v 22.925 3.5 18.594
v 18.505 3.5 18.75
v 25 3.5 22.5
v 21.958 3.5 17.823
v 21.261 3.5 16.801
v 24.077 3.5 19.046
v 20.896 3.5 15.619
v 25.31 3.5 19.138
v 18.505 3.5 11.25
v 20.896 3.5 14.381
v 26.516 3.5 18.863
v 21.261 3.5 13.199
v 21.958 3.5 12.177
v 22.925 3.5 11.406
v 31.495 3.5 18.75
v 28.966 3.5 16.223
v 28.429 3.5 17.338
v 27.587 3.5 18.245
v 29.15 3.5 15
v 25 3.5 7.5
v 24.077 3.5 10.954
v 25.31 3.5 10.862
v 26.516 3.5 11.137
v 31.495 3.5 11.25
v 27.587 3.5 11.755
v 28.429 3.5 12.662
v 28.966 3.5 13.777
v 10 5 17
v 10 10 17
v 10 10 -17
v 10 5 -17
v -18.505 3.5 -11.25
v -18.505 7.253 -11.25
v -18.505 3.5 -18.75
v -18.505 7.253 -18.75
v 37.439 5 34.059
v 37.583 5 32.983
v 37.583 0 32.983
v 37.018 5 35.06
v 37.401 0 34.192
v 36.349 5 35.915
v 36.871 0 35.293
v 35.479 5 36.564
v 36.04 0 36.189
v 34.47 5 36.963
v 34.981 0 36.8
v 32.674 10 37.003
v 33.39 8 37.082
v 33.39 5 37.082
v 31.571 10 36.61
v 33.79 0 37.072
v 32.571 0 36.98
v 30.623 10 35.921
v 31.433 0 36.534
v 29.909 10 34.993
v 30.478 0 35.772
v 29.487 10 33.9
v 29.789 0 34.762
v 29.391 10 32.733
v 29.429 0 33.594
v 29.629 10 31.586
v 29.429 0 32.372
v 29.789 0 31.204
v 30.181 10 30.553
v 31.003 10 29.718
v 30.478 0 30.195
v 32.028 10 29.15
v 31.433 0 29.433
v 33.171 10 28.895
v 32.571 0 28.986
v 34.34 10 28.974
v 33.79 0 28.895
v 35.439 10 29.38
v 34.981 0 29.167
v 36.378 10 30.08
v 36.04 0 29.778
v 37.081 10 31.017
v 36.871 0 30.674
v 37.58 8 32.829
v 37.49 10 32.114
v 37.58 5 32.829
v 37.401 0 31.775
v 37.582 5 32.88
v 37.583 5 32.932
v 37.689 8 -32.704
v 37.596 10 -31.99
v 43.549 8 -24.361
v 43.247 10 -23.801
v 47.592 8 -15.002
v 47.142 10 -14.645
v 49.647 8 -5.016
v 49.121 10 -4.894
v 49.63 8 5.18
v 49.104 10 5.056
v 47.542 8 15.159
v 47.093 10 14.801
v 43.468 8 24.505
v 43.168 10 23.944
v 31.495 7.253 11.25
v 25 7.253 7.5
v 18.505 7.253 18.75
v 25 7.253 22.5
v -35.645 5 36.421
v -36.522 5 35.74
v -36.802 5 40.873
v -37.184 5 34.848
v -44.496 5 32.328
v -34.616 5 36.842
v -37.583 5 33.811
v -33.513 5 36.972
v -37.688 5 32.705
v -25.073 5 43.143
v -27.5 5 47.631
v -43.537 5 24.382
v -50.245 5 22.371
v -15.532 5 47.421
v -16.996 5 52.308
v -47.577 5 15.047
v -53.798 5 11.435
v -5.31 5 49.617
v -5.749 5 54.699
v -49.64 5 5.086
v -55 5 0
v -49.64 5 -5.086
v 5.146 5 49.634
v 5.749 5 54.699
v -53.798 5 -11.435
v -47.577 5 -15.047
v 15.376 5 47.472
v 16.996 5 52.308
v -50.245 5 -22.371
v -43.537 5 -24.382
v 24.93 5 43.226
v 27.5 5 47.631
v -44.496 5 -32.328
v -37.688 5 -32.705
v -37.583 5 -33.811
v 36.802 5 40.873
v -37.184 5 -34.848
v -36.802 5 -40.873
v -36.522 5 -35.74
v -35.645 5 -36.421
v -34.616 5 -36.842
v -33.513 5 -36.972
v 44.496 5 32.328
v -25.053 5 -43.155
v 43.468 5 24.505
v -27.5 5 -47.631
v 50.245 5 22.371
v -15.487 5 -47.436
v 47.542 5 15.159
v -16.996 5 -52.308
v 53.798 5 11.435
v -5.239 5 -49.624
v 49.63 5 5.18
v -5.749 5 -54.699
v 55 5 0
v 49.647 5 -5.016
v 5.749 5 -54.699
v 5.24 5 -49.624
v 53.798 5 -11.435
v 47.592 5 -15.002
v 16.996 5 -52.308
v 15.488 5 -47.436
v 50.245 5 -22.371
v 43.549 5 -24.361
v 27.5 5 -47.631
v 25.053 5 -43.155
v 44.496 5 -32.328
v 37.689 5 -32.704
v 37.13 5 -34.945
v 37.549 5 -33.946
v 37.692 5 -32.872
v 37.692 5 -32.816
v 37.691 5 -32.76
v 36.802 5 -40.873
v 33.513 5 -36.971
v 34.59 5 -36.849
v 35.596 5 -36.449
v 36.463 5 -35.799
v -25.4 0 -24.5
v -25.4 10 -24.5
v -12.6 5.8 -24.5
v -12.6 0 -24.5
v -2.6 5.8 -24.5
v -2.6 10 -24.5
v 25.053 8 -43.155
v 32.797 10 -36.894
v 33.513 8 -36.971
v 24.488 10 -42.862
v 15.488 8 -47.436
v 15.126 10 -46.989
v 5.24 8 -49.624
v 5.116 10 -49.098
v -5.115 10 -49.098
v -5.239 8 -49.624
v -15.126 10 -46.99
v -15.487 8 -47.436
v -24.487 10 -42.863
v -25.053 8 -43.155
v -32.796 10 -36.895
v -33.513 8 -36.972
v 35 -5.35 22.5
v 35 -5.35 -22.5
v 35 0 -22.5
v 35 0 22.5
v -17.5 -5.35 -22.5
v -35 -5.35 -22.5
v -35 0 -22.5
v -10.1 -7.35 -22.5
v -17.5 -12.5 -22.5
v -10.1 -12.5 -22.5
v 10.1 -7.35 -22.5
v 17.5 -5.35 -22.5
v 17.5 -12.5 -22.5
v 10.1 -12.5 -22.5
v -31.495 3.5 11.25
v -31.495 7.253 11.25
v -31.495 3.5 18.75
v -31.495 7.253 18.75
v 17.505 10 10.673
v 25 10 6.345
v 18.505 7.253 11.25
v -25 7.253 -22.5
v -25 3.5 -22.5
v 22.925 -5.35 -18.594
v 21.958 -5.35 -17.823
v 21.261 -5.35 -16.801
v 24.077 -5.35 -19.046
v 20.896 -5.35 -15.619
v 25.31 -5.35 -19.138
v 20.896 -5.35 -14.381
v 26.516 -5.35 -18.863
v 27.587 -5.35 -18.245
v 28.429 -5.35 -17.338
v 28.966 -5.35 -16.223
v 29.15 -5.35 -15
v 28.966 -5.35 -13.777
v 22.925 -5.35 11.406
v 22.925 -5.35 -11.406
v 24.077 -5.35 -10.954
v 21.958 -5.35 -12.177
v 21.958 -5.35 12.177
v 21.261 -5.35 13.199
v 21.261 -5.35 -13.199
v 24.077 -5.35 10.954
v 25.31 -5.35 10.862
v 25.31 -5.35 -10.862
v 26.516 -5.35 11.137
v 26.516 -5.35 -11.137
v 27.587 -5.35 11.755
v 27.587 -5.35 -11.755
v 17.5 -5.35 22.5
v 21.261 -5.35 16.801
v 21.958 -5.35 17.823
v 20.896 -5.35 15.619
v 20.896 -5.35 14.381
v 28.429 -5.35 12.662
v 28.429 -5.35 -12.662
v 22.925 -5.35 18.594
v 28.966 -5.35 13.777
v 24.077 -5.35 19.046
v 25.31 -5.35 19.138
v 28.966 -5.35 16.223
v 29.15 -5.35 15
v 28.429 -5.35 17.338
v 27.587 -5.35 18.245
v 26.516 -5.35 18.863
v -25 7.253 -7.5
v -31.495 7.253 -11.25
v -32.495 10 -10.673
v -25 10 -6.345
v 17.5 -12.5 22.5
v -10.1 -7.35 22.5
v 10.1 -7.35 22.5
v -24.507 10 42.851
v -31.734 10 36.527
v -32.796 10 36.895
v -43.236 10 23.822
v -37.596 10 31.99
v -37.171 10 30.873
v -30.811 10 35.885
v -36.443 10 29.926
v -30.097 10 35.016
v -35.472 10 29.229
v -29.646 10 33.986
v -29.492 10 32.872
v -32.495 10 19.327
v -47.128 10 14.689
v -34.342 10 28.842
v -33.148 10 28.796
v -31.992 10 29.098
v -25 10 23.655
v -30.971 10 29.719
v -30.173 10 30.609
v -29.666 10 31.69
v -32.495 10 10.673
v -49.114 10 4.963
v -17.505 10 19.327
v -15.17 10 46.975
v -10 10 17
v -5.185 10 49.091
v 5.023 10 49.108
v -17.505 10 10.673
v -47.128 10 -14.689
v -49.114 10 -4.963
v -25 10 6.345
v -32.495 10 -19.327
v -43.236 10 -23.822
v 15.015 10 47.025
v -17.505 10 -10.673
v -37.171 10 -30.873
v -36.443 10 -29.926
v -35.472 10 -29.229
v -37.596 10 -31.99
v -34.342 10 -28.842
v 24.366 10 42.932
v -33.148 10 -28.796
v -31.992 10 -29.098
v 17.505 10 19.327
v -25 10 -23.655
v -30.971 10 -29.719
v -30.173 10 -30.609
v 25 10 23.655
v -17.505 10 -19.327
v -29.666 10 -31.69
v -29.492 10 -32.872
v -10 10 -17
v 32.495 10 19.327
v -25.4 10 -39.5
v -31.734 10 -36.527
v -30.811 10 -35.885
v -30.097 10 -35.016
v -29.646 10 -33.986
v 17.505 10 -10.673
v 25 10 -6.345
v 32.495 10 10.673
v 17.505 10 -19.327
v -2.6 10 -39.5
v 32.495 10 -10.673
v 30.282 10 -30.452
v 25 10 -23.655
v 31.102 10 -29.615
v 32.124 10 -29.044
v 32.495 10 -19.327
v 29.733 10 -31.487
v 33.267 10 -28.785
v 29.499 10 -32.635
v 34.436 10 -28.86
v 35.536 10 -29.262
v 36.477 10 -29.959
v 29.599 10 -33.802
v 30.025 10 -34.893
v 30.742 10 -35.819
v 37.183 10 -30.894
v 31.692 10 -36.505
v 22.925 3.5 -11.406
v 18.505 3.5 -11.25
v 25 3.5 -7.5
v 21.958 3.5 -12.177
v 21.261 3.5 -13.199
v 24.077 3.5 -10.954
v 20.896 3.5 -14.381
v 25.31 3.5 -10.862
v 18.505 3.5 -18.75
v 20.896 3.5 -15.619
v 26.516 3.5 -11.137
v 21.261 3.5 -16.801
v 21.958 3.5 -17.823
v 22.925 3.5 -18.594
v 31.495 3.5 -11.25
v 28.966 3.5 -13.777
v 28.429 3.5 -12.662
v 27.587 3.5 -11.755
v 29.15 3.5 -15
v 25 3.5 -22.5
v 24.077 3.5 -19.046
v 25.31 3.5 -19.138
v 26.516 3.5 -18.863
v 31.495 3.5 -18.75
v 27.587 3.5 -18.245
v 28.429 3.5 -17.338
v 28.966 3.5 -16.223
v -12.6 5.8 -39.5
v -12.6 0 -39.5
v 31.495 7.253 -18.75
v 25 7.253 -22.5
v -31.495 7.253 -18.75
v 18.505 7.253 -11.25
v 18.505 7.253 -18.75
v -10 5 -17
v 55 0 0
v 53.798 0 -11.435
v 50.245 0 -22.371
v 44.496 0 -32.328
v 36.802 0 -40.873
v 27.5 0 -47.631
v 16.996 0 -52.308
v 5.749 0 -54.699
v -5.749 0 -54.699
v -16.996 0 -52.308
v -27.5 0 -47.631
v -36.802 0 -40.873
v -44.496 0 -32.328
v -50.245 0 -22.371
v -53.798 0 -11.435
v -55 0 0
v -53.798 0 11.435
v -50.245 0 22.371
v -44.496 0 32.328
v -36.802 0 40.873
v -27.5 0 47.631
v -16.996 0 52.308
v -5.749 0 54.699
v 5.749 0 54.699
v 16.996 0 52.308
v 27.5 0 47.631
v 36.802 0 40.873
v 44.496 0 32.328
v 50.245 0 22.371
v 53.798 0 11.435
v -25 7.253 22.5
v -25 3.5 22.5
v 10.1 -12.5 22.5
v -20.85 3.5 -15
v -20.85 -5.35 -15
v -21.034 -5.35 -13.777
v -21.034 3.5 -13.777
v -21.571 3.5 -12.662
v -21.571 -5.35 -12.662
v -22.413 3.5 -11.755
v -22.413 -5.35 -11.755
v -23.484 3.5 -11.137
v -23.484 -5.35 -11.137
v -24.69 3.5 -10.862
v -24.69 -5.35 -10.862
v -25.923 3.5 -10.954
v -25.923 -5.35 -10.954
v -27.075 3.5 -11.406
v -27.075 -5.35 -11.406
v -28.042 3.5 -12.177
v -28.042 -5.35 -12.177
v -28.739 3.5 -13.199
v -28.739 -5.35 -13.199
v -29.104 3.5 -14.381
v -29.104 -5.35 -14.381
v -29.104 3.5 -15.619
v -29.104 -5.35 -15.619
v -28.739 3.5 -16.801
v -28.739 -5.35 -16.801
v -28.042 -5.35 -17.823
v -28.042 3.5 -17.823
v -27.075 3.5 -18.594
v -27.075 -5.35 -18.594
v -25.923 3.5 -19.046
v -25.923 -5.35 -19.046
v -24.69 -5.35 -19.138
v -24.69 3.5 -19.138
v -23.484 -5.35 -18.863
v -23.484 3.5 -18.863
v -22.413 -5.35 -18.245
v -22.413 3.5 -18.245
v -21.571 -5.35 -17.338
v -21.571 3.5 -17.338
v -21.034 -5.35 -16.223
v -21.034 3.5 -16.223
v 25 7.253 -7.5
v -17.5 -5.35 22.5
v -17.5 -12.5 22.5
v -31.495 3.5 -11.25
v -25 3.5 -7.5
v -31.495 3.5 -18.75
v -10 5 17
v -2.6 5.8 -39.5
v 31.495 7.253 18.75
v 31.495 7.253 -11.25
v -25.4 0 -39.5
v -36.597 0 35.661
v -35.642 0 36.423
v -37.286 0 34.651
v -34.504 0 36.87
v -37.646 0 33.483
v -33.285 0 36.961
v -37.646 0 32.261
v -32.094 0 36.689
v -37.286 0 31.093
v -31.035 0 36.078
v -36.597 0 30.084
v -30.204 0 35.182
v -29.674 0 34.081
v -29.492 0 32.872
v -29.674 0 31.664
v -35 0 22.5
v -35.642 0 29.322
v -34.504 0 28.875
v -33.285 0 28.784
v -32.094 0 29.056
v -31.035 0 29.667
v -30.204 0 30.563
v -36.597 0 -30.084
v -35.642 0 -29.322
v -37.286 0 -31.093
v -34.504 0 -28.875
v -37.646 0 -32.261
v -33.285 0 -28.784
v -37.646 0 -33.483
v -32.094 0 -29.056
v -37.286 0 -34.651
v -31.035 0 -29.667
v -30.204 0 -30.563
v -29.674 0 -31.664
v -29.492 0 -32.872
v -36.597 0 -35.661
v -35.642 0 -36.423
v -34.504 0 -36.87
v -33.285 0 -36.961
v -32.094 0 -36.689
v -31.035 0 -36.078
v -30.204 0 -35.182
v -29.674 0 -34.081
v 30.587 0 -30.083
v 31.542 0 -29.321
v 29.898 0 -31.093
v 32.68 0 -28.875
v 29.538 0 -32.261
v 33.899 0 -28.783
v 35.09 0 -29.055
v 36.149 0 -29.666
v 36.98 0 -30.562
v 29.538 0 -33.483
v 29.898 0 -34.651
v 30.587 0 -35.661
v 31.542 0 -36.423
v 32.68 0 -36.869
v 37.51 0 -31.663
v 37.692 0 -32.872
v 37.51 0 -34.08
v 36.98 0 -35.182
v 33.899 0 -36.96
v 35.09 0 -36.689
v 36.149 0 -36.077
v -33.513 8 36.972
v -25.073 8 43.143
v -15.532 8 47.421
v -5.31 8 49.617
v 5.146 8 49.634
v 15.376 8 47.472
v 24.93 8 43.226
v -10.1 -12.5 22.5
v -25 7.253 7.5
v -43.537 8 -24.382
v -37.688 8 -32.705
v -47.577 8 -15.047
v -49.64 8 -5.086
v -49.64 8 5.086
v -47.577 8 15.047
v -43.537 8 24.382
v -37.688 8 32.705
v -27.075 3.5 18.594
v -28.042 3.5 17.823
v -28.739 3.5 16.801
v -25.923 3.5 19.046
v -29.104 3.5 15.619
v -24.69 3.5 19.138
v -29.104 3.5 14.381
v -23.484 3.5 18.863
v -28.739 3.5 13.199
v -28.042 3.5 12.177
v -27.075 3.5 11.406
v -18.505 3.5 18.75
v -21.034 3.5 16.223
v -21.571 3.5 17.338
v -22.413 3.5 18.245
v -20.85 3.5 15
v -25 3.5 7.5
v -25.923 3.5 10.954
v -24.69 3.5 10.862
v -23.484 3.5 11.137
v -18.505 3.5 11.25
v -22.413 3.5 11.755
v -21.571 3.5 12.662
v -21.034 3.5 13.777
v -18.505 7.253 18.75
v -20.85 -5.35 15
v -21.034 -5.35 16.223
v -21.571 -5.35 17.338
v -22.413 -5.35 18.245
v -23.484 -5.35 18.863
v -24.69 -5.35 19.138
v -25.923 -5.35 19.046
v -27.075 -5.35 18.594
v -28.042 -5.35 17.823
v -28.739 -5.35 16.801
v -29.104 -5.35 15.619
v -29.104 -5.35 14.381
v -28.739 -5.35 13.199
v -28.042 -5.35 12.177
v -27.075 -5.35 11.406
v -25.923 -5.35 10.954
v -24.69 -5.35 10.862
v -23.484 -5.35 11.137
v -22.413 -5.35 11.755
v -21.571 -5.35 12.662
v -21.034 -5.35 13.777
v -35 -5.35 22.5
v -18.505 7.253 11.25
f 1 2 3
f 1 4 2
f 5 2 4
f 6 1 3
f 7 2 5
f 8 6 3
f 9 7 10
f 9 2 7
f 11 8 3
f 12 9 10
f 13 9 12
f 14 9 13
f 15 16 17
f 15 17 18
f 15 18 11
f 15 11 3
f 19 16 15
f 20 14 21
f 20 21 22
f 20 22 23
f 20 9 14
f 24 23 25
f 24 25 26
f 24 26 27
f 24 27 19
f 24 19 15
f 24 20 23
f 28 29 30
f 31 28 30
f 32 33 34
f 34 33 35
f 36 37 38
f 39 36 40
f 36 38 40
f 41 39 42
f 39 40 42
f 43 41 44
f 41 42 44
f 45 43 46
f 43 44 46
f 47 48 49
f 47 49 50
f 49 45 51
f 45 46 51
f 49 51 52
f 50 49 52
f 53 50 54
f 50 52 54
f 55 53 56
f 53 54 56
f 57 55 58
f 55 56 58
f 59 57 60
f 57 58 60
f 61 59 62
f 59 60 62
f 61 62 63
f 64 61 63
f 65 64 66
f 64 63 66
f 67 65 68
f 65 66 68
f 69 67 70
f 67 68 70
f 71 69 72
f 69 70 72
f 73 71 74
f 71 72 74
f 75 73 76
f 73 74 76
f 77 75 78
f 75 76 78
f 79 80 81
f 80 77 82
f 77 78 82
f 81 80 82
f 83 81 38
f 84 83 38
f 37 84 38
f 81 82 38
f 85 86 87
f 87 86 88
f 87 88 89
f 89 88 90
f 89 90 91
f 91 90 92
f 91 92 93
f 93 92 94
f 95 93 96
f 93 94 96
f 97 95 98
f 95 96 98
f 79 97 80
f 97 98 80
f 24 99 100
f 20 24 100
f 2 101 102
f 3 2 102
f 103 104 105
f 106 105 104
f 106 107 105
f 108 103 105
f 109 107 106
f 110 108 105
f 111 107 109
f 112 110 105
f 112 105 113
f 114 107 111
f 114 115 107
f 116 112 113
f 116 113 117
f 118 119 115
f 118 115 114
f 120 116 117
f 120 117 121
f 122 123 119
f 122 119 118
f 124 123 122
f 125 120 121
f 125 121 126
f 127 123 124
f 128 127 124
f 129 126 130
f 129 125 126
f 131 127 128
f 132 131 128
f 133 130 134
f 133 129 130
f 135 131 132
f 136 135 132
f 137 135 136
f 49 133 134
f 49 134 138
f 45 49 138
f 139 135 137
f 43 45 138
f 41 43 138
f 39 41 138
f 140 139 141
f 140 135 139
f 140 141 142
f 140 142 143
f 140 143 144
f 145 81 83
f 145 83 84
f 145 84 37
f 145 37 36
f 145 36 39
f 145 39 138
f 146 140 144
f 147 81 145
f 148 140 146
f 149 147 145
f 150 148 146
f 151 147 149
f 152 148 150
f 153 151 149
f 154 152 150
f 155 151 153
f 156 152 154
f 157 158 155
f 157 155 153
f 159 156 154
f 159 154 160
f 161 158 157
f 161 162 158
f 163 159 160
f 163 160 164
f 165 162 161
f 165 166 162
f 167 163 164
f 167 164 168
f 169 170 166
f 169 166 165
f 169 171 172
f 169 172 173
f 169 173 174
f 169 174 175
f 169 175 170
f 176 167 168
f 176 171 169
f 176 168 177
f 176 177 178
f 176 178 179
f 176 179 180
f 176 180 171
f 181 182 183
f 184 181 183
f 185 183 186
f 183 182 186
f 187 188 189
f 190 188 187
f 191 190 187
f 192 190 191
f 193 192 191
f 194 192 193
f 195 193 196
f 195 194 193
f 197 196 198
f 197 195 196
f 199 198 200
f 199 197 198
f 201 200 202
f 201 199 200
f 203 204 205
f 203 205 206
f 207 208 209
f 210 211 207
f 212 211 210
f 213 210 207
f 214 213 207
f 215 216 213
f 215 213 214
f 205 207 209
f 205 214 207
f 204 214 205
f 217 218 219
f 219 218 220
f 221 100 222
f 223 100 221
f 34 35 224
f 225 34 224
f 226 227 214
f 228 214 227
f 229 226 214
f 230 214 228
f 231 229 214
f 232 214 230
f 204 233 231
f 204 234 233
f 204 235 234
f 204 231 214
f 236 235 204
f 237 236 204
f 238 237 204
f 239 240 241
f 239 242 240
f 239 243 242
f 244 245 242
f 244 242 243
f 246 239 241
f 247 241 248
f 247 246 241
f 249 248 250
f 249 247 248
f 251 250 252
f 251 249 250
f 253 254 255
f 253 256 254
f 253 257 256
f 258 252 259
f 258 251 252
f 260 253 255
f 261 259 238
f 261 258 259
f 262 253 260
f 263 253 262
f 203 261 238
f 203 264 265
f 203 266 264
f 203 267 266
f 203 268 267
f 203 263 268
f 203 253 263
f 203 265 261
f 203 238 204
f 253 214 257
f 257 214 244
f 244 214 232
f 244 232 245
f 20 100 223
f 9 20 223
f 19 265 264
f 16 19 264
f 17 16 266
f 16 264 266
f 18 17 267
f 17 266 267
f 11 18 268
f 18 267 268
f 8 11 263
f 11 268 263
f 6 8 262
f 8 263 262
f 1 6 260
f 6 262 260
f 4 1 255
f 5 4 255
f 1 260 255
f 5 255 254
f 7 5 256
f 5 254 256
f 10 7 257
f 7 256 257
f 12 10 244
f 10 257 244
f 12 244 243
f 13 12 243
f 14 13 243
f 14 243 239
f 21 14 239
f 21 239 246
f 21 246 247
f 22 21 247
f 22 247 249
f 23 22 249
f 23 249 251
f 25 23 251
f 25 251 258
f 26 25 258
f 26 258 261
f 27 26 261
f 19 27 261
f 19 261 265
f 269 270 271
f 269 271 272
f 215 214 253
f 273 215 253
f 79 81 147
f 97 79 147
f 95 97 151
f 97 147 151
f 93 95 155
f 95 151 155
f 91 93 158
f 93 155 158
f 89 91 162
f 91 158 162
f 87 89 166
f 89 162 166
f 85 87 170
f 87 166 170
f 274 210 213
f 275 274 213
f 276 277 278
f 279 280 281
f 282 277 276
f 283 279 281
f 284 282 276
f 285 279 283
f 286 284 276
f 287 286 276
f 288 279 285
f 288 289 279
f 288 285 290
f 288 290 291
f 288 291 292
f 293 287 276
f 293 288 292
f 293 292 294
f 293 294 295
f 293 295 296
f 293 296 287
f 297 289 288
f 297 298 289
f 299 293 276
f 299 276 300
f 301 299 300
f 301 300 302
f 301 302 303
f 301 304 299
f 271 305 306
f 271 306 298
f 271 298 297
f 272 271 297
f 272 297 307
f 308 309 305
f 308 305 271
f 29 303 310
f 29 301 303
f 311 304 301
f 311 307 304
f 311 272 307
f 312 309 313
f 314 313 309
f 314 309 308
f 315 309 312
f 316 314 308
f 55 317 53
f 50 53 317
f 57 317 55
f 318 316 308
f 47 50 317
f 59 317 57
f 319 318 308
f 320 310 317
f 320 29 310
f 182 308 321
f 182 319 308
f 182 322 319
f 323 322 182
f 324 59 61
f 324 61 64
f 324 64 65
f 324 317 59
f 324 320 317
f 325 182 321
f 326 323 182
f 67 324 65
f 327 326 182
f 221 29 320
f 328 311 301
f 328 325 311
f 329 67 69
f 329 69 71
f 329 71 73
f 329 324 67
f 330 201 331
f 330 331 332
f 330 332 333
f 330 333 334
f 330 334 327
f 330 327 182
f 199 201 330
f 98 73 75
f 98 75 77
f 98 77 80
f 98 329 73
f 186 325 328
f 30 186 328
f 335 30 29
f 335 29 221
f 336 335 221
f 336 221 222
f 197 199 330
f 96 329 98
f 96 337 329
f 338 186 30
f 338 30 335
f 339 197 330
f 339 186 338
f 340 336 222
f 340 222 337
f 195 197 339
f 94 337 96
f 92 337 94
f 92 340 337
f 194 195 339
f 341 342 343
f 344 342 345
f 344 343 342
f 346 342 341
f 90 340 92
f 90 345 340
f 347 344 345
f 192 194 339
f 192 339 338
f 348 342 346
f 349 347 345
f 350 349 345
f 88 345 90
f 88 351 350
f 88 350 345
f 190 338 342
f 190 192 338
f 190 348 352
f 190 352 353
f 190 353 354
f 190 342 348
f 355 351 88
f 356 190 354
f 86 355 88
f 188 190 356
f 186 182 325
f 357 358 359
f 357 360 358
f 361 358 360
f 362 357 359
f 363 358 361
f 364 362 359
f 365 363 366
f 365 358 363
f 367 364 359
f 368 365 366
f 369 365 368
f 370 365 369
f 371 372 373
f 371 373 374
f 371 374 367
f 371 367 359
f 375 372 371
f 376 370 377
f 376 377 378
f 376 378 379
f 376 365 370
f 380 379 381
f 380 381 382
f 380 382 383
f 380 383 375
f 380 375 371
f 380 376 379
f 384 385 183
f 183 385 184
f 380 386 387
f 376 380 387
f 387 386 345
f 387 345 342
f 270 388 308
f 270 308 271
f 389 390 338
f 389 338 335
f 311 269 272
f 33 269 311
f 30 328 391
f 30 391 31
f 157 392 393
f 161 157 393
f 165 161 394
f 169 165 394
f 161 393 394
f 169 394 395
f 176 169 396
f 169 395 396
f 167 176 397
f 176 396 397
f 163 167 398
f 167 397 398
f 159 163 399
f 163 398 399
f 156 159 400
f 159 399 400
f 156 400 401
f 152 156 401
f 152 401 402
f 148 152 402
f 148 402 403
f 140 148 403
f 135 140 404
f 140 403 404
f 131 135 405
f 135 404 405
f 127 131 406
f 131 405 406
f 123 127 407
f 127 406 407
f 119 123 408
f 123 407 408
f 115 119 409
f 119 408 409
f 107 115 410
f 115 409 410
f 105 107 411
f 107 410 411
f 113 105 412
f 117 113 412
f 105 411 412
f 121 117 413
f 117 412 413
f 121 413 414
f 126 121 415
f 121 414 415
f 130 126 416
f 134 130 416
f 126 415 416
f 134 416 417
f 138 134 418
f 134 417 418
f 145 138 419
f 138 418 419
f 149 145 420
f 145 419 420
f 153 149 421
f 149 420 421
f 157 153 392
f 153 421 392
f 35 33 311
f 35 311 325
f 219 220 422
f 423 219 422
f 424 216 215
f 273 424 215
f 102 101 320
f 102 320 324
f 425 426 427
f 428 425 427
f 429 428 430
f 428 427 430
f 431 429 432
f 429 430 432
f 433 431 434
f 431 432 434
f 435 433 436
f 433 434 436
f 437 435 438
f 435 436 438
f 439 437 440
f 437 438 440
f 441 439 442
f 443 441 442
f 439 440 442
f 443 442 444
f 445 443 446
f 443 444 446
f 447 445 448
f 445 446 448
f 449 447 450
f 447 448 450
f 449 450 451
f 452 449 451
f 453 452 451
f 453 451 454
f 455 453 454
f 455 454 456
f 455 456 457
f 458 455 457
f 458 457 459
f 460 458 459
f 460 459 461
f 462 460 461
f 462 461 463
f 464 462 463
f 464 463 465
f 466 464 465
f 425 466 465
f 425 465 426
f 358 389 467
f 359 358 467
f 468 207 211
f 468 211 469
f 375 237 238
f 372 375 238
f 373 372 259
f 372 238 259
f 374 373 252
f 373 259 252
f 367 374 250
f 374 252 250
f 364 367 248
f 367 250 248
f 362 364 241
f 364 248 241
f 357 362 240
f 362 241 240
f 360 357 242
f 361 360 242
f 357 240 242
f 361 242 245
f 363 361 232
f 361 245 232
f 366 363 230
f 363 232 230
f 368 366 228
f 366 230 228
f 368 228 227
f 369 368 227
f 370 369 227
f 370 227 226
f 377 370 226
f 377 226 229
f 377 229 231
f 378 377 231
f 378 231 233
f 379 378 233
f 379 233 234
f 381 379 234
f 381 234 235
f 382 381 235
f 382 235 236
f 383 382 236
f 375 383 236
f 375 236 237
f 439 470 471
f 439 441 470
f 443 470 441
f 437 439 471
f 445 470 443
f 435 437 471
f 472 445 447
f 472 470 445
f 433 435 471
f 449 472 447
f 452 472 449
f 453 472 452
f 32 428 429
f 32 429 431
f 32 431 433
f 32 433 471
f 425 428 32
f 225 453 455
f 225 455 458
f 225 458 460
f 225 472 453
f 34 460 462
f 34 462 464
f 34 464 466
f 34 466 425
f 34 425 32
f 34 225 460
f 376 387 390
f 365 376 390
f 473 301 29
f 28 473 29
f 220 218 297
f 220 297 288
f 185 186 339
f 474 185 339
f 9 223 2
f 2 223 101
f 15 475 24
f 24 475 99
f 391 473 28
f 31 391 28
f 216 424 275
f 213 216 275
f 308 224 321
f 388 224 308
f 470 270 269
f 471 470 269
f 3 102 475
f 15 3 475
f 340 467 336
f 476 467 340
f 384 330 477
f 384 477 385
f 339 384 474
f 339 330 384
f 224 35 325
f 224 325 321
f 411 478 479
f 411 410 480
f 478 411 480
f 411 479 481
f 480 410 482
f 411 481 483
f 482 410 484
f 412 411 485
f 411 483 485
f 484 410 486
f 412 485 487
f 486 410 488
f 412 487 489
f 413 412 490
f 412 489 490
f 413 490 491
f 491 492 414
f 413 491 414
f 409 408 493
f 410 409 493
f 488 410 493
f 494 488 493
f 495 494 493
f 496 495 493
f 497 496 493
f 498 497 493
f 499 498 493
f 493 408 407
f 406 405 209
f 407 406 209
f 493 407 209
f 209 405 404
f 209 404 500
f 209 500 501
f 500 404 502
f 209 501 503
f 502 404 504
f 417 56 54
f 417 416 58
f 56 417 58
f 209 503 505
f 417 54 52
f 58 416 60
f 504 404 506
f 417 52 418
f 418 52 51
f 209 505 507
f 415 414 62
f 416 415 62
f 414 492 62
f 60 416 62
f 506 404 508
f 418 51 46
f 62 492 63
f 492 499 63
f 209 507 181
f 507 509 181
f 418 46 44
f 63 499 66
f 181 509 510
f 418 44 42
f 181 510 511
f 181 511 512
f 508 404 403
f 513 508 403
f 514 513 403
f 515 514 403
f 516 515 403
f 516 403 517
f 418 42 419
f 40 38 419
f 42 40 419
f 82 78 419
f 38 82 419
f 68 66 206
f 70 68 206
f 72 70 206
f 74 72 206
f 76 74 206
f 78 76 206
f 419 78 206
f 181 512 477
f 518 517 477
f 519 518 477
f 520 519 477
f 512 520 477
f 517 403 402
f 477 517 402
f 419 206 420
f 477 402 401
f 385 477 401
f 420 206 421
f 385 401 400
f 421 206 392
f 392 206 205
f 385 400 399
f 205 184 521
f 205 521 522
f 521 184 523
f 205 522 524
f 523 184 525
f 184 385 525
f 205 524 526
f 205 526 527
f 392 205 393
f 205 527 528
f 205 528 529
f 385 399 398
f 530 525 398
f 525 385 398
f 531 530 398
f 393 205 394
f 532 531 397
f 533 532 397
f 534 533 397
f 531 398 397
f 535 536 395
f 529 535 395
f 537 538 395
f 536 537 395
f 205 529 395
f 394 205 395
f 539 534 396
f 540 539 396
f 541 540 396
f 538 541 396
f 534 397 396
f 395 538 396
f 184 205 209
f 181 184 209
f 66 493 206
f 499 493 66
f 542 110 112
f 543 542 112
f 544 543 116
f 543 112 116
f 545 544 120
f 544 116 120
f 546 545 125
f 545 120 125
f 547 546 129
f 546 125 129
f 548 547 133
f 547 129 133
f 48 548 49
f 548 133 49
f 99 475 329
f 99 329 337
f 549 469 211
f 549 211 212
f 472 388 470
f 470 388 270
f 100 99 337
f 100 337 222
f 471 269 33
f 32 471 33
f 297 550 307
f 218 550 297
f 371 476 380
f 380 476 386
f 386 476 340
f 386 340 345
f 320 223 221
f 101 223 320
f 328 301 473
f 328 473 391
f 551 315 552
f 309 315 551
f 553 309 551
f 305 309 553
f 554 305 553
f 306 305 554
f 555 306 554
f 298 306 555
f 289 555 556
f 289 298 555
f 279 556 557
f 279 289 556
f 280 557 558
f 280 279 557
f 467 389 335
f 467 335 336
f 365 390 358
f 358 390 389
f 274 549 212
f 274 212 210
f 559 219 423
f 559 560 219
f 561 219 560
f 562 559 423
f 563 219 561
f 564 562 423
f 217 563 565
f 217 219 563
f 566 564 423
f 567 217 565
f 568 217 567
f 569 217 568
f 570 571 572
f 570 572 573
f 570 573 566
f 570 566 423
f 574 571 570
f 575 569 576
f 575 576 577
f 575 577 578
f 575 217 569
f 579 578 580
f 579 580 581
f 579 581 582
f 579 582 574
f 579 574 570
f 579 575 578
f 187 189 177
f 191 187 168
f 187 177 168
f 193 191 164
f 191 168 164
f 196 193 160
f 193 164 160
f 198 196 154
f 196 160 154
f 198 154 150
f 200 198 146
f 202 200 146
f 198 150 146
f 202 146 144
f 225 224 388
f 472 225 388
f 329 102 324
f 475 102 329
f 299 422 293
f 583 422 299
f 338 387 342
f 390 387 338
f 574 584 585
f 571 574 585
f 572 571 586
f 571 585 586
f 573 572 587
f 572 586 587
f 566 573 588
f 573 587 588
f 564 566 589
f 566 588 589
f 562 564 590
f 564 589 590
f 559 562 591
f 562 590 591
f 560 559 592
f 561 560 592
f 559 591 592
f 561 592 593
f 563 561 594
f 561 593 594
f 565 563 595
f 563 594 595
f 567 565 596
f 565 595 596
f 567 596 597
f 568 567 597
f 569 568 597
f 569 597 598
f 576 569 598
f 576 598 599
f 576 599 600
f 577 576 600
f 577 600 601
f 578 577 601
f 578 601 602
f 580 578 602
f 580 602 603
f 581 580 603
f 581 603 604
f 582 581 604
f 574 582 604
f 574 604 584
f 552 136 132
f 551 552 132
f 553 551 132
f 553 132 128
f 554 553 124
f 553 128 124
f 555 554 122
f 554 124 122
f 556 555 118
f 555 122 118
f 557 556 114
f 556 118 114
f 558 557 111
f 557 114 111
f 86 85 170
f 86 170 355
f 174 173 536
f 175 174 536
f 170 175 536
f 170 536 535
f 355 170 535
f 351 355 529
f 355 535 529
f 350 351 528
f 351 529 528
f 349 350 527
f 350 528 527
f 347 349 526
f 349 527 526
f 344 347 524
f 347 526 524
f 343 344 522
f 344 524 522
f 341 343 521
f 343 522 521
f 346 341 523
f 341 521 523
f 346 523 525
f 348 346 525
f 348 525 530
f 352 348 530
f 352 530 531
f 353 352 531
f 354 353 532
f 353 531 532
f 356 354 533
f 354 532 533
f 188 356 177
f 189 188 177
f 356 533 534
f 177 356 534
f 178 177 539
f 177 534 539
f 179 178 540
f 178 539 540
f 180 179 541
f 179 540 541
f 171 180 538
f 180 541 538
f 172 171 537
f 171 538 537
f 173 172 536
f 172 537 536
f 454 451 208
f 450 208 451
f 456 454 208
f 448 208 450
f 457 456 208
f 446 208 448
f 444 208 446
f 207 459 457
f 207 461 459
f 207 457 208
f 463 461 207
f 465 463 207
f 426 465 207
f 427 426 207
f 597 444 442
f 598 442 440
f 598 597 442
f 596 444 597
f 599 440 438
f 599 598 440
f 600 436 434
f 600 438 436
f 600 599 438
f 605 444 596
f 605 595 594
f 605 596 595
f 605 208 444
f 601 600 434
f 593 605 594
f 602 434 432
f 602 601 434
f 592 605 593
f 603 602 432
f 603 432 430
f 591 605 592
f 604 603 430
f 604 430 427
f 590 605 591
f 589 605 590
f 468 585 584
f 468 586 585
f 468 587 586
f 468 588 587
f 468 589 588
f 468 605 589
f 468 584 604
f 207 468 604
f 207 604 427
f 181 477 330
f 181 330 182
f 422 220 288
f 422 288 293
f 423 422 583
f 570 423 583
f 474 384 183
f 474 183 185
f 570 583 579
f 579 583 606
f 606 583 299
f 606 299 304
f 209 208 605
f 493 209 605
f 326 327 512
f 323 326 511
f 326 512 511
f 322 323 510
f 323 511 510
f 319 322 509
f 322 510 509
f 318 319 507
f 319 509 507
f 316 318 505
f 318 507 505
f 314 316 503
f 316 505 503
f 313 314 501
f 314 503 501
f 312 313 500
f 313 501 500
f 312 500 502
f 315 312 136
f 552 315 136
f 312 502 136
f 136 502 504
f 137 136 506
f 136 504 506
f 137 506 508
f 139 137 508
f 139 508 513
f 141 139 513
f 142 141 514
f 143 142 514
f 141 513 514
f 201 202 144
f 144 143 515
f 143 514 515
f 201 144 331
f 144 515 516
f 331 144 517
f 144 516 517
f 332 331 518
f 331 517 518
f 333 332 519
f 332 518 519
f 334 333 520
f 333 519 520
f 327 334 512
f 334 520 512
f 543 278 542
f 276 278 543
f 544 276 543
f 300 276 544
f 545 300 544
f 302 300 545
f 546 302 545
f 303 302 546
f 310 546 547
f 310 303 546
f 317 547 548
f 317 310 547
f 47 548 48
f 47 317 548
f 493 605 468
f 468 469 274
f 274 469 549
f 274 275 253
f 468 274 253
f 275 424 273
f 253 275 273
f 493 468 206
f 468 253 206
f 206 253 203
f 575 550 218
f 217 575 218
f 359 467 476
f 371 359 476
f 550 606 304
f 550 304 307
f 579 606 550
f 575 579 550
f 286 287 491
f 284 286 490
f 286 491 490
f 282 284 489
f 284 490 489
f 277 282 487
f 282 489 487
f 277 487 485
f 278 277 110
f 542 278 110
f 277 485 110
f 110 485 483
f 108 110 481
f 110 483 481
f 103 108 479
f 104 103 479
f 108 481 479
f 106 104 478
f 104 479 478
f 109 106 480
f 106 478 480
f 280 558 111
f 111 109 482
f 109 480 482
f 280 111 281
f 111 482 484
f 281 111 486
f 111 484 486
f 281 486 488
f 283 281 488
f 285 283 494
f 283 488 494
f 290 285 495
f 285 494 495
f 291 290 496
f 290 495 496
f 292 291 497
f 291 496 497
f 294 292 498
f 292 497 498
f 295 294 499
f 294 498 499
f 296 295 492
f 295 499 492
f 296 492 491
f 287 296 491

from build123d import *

# Parameters (mm, degrees)
SKETCH_1_R            = 55
EXTRUDE_1_DEPTH       = 5
SKETCH_2_R            = 49.9
EXTRUDE_2_DEPTH       = 5
SKETCH_3_W            = 35
SKETCH_3_H            = 45
EXTRUDE_3_DEPTH       = 25
SKETCH_4_W            = 20.2
SKETCH_4_H            = 10.3
CUT_EXTRUDE_1_DEPTH   = 78.5
SKETCH_5_R            = 4.1
CUT_EXTRUDE_2_DEPTH   = 11
SKETCH_6_R            = 2.75
CUT_EXTRUDE_3_DEPTH   = 36
CHAMFER1_SIZE         = 2
CHAMFER1_SIZE2        = 0.535898385
CHAMFER1_PART_2_SIZE  = 2
CHAMFER1_PART_2_SIZE2 = 0.535898385
CHAMFER1_PART_3_SIZE  = 2
CHAMFER1_PART_3_SIZE2 = 0.535898385
CHAMFER1_PART_4_SIZE  = 2
CHAMFER1_PART_4_SIZE2 = 0.535898385
SKETCH2_W             = 35.065209797
SKETCH2_H             = 45
CUT_EXTRUDE1_DEPTH    = 12.5
BOSS_EXTRUDE1_START   = -2
SKETCH4_W             = 70
SKETCH4_H             = 45
BOSS_EXTRUDE1_DEPTH   = 5.35
SKETCH5_R             = 4.15
CUT_EXTRUDE2_DEPTH    = 16.3500001
CUT_EXTRUDE3_DEPTH    = 6.5
SKETCH7_W             = 20
SKETCH7_H             = 34
CUT_EXTRUDE4_DEPTH    = 5
CHAMFER2_SIZE         = 1
CHAMFER2_SIZE2        = 2.747477419
SKETCH8_W             = 12.8
SKETCH8_H             = 15
CUT_EXTRUDE5_DEPTH    = 11.0000001
SKETCH9_W             = 10
SKETCH9_H             = 15
CUT_EXTRUDE6_DEPTH    = 4.2


with BuildPart() as part:
    # Эскиз1 → Бобышка-Вытянуть1 (new body)
    with BuildSketch(Plane(origin=(0, 0, 0), x_dir=(1, 0, 0), z_dir=(0, 1, 0))):
        Circle(SKETCH_1_R)
    extrude(amount=EXTRUDE_1_DEPTH)

    # Эскиз2 → Бобышка-Вытянуть2 (add)
    with BuildSketch(Plane(origin=(0, 5, 0), x_dir=(1, 0, 0), z_dir=(0, 1, 0))):
        Circle(SKETCH_2_R)
    extrude(amount=EXTRUDE_2_DEPTH)

    # Эскиз3 → Бобышка-Вытянуть3 (add)
    with BuildSketch(Plane.XZ):
        Rectangle(SKETCH_3_W, SKETCH_3_H)
    extrude(amount=EXTRUDE_3_DEPTH)

    # Эскиз4 → Вырез-Вытянуть1 (cut, through all)
    with BuildSketch(Plane.XY.offset(22.5)):
        with Locations((0, -12.5)):
            Rectangle(SKETCH_4_W, SKETCH_4_H)
    extrude(amount=-CUT_EXTRUDE_1_DEPTH, mode=Mode.SUBTRACT)

    # Эскиз5 → Вырез-Вытянуть2 (cut, through all)
    with BuildSketch(Plane.XZ):
        with Locations((33.592198598, -32.871936263)):
            Circle(SKETCH_5_R)
        with Locations((-33.591727056, -32.872418125)):
            Circle(SKETCH_5_R)
        with Locations((-33.591727056, 32.872418125)):
            Circle(SKETCH_5_R)
        with Locations((33.483215177, 32.983215177)):
            Circle(SKETCH_5_R)
    extrude(amount=-CUT_EXTRUDE_2_DEPTH, mode=Mode.SUBTRACT)

    # Эскиз6 → Вырез-Вытянуть3 (cut, through all)
    with BuildSketch(Plane(origin=(0, 10, 0), x_dir=(1, 0, 0), z_dir=(0, 1, 0))):
        with Locations((-17.999799176, 27.999999999)):
            Circle(SKETCH_6_R)
    extrude(amount=-CUT_EXTRUDE_3_DEPTH, mode=Mode.SUBTRACT)

    # Chamfer1
    chamfer1_edges = [part.edges().sort_by_distance(p)[0] for p in [
        (0.000357897, 10, -49.899999999),
    ]]
    chamfer1_side = [part.faces().sort_by_distance(p)[0] for p in [
        (0.000357897, 7.5, -49.899999999),
    ]]
    chamfer(chamfer1_edges, length=CHAMFER1_SIZE, length2=CHAMFER1_SIZE2, reference=chamfer1_side[0])

    # Chamfer1 part 2
    chamfer1_part_2_edges = [part.edges().sort_by_distance(p)[0] for p in [
        (-49.9, 10, 0),
    ]]
    chamfer1_part_2_side = [part.faces().sort_by_distance(p)[0] for p in [
        (-49.9, 7.5, 0),
    ]]
    chamfer(chamfer1_part_2_edges, length=CHAMFER1_PART_2_SIZE, length2=CHAMFER1_PART_2_SIZE2, reference=chamfer1_part_2_side[0])

    # Chamfer1 part 3
    chamfer1_part_3_edges = [part.edges().sort_by_distance(p)[0] for p in [
        (-0.08242255, 10, 49.899931929),
    ]]
    chamfer1_part_3_side = [part.faces().sort_by_distance(p)[0] for p in [
        (-0.08242255, 7.5, 49.899931929),
    ]]
    chamfer(chamfer1_part_3_edges, length=CHAMFER1_PART_3_SIZE, length2=CHAMFER1_PART_3_SIZE2, reference=chamfer1_part_3_side[0])

    # Chamfer1 part 4
    chamfer1_part_4_edges = [part.edges().sort_by_distance(p)[0] for p in [
        (49.899931657, 10, 0.082587101),
    ]]
    chamfer1_part_4_side = [part.faces().sort_by_distance(p)[0] for p in [
        (49.899931657, 7.5, 0.082587101),
    ]]
    chamfer(chamfer1_part_4_edges, length=CHAMFER1_PART_4_SIZE, length2=CHAMFER1_PART_4_SIZE2, reference=chamfer1_part_4_side[0])

    # Sketch2 → Cut-Extrude1 (cut)
    with BuildSketch(Plane.XZ.offset(25)):
        with Locations((-0.032604899, 0)):
            Rectangle(SKETCH2_W, SKETCH2_H)
    extrude(amount=-CUT_EXTRUDE1_DEPTH, mode=Mode.SUBTRACT)

    # Sketch4 → Boss-Extrude1 (add)
    with BuildSketch(Plane.XZ.offset(7.35).offset(BOSS_EXTRUDE1_START)):
        Rectangle(SKETCH4_W, SKETCH4_H)
    extrude(amount=-BOSS_EXTRUDE1_DEPTH)

    # Sketch5 → Cut-Extrude2 (cut, through all)
    with BuildSketch(Plane.XZ.offset(5.35)):
        with Locations((25, 15)):
            Circle(SKETCH5_R)
        with Locations((-25, 15)):
            Circle(SKETCH5_R)
        with Locations((25, -15)):
            Circle(SKETCH5_R)
        with Locations((-25, -15)):
            Circle(SKETCH5_R)
    extrude(amount=-CUT_EXTRUDE2_DEPTH, mode=Mode.SUBTRACT)

    # Sketch6 → Cut-Extrude3 (cut)
    with BuildSketch(Plane(origin=(0, 10, 0), x_dir=(1, 0, 0), z_dir=(0, 1, 0))):
        Polygon((-18.504809472, -11.25), (-25, -7.5), (-31.495190528, -11.25), (-31.495190528, -18.75), (-25, -22.5), (-18.504809472, -18.75), align=None)
        Polygon((31.495190528, -11.25), (25, -7.5), (18.504809472, -11.25), (18.504809472, -18.75), (25, -22.5), (31.495190528, -18.75), align=None)
        Polygon((31.495190528, 18.75), (25, 22.5), (18.504809472, 18.75), (18.504809472, 11.25), (25, 7.5), (31.495190528, 11.25), align=None)
        Polygon((-18.504809472, 18.75), (-25, 22.5), (-31.495190528, 18.75), (-31.495190528, 11.25), (-25, 7.5), (-18.504809472, 11.25), align=None)
    extrude(amount=-CUT_EXTRUDE3_DEPTH, mode=Mode.SUBTRACT)

    # Sketch7 → Cut-Extrude4 (cut)
    with BuildSketch(Plane(origin=(0, 10, 0), x_dir=(1, 0, 0), z_dir=(0, 1, 0))):
        Rectangle(SKETCH7_W, SKETCH7_H)
    extrude(amount=-CUT_EXTRUDE4_DEPTH, mode=Mode.SUBTRACT)

    # Chamfer2
    chamfer2_edges = [part.edges().sort_by_distance(p)[0] for p in [
        (-18.504809472, 10, 15),
        (-21.752404736, 10, 9.375),
        (-28.247595264, 10, 9.375),
        (-31.495190528, 10, 15),
        (-28.247595264, 10, 20.625),
        (-21.752404736, 10, 20.625),
        (31.495190528, 10, 15),
        (28.247595264, 10, 9.375),
        (21.752404736, 10, 9.375),
        (18.504809472, 10, 15),
        (21.752404736, 10, 20.625),
        (28.247595264, 10, 20.625),
        (31.495190528, 10, -15),
        (28.247595264, 10, -20.625),
        (21.752404736, 10, -20.625),
        (18.504809472, 10, -15),
        (21.752404736, 10, -9.375),
        (28.247595264, 10, -9.375),
        (-18.504809472, 10, -15),
        (-21.752404736, 10, -20.625),
        (-28.247595264, 10, -20.625),
        (-31.495190528, 10, -15),
        (-28.247595264, 10, -9.375),
        (-21.752404736, 10, -9.375),
    ]]
    chamfer2_side = [part.faces().sort_by_distance(p)[0] for p in [
        (29.567670169, 10, 29.126140435),
    ]]
    chamfer(chamfer2_edges, length=CHAMFER2_SIZE, length2=CHAMFER2_SIZE2, reference=chamfer2_side[0])

    # Sketch8 → Cut-Extrude5 (cut, through all)
    with BuildSketch(Plane.XZ):
        with Locations((-19, -32)):
            Rectangle(SKETCH8_W, SKETCH8_H)
    extrude(amount=-CUT_EXTRUDE5_DEPTH, mode=Mode.SUBTRACT)

    # Sketch9 → Cut-Extrude6 (cut)
    with BuildSketch(Plane(origin=(0, 10, 0), x_dir=(1, 0, 0), z_dir=(0, 1, 0))):
        with Locations((-7.6, 32)):
            Rectangle(SKETCH9_W, SKETCH9_H)
    extrude(amount=-CUT_EXTRUDE6_DEPTH, mode=Mode.SUBTRACT)


solid = part.part
